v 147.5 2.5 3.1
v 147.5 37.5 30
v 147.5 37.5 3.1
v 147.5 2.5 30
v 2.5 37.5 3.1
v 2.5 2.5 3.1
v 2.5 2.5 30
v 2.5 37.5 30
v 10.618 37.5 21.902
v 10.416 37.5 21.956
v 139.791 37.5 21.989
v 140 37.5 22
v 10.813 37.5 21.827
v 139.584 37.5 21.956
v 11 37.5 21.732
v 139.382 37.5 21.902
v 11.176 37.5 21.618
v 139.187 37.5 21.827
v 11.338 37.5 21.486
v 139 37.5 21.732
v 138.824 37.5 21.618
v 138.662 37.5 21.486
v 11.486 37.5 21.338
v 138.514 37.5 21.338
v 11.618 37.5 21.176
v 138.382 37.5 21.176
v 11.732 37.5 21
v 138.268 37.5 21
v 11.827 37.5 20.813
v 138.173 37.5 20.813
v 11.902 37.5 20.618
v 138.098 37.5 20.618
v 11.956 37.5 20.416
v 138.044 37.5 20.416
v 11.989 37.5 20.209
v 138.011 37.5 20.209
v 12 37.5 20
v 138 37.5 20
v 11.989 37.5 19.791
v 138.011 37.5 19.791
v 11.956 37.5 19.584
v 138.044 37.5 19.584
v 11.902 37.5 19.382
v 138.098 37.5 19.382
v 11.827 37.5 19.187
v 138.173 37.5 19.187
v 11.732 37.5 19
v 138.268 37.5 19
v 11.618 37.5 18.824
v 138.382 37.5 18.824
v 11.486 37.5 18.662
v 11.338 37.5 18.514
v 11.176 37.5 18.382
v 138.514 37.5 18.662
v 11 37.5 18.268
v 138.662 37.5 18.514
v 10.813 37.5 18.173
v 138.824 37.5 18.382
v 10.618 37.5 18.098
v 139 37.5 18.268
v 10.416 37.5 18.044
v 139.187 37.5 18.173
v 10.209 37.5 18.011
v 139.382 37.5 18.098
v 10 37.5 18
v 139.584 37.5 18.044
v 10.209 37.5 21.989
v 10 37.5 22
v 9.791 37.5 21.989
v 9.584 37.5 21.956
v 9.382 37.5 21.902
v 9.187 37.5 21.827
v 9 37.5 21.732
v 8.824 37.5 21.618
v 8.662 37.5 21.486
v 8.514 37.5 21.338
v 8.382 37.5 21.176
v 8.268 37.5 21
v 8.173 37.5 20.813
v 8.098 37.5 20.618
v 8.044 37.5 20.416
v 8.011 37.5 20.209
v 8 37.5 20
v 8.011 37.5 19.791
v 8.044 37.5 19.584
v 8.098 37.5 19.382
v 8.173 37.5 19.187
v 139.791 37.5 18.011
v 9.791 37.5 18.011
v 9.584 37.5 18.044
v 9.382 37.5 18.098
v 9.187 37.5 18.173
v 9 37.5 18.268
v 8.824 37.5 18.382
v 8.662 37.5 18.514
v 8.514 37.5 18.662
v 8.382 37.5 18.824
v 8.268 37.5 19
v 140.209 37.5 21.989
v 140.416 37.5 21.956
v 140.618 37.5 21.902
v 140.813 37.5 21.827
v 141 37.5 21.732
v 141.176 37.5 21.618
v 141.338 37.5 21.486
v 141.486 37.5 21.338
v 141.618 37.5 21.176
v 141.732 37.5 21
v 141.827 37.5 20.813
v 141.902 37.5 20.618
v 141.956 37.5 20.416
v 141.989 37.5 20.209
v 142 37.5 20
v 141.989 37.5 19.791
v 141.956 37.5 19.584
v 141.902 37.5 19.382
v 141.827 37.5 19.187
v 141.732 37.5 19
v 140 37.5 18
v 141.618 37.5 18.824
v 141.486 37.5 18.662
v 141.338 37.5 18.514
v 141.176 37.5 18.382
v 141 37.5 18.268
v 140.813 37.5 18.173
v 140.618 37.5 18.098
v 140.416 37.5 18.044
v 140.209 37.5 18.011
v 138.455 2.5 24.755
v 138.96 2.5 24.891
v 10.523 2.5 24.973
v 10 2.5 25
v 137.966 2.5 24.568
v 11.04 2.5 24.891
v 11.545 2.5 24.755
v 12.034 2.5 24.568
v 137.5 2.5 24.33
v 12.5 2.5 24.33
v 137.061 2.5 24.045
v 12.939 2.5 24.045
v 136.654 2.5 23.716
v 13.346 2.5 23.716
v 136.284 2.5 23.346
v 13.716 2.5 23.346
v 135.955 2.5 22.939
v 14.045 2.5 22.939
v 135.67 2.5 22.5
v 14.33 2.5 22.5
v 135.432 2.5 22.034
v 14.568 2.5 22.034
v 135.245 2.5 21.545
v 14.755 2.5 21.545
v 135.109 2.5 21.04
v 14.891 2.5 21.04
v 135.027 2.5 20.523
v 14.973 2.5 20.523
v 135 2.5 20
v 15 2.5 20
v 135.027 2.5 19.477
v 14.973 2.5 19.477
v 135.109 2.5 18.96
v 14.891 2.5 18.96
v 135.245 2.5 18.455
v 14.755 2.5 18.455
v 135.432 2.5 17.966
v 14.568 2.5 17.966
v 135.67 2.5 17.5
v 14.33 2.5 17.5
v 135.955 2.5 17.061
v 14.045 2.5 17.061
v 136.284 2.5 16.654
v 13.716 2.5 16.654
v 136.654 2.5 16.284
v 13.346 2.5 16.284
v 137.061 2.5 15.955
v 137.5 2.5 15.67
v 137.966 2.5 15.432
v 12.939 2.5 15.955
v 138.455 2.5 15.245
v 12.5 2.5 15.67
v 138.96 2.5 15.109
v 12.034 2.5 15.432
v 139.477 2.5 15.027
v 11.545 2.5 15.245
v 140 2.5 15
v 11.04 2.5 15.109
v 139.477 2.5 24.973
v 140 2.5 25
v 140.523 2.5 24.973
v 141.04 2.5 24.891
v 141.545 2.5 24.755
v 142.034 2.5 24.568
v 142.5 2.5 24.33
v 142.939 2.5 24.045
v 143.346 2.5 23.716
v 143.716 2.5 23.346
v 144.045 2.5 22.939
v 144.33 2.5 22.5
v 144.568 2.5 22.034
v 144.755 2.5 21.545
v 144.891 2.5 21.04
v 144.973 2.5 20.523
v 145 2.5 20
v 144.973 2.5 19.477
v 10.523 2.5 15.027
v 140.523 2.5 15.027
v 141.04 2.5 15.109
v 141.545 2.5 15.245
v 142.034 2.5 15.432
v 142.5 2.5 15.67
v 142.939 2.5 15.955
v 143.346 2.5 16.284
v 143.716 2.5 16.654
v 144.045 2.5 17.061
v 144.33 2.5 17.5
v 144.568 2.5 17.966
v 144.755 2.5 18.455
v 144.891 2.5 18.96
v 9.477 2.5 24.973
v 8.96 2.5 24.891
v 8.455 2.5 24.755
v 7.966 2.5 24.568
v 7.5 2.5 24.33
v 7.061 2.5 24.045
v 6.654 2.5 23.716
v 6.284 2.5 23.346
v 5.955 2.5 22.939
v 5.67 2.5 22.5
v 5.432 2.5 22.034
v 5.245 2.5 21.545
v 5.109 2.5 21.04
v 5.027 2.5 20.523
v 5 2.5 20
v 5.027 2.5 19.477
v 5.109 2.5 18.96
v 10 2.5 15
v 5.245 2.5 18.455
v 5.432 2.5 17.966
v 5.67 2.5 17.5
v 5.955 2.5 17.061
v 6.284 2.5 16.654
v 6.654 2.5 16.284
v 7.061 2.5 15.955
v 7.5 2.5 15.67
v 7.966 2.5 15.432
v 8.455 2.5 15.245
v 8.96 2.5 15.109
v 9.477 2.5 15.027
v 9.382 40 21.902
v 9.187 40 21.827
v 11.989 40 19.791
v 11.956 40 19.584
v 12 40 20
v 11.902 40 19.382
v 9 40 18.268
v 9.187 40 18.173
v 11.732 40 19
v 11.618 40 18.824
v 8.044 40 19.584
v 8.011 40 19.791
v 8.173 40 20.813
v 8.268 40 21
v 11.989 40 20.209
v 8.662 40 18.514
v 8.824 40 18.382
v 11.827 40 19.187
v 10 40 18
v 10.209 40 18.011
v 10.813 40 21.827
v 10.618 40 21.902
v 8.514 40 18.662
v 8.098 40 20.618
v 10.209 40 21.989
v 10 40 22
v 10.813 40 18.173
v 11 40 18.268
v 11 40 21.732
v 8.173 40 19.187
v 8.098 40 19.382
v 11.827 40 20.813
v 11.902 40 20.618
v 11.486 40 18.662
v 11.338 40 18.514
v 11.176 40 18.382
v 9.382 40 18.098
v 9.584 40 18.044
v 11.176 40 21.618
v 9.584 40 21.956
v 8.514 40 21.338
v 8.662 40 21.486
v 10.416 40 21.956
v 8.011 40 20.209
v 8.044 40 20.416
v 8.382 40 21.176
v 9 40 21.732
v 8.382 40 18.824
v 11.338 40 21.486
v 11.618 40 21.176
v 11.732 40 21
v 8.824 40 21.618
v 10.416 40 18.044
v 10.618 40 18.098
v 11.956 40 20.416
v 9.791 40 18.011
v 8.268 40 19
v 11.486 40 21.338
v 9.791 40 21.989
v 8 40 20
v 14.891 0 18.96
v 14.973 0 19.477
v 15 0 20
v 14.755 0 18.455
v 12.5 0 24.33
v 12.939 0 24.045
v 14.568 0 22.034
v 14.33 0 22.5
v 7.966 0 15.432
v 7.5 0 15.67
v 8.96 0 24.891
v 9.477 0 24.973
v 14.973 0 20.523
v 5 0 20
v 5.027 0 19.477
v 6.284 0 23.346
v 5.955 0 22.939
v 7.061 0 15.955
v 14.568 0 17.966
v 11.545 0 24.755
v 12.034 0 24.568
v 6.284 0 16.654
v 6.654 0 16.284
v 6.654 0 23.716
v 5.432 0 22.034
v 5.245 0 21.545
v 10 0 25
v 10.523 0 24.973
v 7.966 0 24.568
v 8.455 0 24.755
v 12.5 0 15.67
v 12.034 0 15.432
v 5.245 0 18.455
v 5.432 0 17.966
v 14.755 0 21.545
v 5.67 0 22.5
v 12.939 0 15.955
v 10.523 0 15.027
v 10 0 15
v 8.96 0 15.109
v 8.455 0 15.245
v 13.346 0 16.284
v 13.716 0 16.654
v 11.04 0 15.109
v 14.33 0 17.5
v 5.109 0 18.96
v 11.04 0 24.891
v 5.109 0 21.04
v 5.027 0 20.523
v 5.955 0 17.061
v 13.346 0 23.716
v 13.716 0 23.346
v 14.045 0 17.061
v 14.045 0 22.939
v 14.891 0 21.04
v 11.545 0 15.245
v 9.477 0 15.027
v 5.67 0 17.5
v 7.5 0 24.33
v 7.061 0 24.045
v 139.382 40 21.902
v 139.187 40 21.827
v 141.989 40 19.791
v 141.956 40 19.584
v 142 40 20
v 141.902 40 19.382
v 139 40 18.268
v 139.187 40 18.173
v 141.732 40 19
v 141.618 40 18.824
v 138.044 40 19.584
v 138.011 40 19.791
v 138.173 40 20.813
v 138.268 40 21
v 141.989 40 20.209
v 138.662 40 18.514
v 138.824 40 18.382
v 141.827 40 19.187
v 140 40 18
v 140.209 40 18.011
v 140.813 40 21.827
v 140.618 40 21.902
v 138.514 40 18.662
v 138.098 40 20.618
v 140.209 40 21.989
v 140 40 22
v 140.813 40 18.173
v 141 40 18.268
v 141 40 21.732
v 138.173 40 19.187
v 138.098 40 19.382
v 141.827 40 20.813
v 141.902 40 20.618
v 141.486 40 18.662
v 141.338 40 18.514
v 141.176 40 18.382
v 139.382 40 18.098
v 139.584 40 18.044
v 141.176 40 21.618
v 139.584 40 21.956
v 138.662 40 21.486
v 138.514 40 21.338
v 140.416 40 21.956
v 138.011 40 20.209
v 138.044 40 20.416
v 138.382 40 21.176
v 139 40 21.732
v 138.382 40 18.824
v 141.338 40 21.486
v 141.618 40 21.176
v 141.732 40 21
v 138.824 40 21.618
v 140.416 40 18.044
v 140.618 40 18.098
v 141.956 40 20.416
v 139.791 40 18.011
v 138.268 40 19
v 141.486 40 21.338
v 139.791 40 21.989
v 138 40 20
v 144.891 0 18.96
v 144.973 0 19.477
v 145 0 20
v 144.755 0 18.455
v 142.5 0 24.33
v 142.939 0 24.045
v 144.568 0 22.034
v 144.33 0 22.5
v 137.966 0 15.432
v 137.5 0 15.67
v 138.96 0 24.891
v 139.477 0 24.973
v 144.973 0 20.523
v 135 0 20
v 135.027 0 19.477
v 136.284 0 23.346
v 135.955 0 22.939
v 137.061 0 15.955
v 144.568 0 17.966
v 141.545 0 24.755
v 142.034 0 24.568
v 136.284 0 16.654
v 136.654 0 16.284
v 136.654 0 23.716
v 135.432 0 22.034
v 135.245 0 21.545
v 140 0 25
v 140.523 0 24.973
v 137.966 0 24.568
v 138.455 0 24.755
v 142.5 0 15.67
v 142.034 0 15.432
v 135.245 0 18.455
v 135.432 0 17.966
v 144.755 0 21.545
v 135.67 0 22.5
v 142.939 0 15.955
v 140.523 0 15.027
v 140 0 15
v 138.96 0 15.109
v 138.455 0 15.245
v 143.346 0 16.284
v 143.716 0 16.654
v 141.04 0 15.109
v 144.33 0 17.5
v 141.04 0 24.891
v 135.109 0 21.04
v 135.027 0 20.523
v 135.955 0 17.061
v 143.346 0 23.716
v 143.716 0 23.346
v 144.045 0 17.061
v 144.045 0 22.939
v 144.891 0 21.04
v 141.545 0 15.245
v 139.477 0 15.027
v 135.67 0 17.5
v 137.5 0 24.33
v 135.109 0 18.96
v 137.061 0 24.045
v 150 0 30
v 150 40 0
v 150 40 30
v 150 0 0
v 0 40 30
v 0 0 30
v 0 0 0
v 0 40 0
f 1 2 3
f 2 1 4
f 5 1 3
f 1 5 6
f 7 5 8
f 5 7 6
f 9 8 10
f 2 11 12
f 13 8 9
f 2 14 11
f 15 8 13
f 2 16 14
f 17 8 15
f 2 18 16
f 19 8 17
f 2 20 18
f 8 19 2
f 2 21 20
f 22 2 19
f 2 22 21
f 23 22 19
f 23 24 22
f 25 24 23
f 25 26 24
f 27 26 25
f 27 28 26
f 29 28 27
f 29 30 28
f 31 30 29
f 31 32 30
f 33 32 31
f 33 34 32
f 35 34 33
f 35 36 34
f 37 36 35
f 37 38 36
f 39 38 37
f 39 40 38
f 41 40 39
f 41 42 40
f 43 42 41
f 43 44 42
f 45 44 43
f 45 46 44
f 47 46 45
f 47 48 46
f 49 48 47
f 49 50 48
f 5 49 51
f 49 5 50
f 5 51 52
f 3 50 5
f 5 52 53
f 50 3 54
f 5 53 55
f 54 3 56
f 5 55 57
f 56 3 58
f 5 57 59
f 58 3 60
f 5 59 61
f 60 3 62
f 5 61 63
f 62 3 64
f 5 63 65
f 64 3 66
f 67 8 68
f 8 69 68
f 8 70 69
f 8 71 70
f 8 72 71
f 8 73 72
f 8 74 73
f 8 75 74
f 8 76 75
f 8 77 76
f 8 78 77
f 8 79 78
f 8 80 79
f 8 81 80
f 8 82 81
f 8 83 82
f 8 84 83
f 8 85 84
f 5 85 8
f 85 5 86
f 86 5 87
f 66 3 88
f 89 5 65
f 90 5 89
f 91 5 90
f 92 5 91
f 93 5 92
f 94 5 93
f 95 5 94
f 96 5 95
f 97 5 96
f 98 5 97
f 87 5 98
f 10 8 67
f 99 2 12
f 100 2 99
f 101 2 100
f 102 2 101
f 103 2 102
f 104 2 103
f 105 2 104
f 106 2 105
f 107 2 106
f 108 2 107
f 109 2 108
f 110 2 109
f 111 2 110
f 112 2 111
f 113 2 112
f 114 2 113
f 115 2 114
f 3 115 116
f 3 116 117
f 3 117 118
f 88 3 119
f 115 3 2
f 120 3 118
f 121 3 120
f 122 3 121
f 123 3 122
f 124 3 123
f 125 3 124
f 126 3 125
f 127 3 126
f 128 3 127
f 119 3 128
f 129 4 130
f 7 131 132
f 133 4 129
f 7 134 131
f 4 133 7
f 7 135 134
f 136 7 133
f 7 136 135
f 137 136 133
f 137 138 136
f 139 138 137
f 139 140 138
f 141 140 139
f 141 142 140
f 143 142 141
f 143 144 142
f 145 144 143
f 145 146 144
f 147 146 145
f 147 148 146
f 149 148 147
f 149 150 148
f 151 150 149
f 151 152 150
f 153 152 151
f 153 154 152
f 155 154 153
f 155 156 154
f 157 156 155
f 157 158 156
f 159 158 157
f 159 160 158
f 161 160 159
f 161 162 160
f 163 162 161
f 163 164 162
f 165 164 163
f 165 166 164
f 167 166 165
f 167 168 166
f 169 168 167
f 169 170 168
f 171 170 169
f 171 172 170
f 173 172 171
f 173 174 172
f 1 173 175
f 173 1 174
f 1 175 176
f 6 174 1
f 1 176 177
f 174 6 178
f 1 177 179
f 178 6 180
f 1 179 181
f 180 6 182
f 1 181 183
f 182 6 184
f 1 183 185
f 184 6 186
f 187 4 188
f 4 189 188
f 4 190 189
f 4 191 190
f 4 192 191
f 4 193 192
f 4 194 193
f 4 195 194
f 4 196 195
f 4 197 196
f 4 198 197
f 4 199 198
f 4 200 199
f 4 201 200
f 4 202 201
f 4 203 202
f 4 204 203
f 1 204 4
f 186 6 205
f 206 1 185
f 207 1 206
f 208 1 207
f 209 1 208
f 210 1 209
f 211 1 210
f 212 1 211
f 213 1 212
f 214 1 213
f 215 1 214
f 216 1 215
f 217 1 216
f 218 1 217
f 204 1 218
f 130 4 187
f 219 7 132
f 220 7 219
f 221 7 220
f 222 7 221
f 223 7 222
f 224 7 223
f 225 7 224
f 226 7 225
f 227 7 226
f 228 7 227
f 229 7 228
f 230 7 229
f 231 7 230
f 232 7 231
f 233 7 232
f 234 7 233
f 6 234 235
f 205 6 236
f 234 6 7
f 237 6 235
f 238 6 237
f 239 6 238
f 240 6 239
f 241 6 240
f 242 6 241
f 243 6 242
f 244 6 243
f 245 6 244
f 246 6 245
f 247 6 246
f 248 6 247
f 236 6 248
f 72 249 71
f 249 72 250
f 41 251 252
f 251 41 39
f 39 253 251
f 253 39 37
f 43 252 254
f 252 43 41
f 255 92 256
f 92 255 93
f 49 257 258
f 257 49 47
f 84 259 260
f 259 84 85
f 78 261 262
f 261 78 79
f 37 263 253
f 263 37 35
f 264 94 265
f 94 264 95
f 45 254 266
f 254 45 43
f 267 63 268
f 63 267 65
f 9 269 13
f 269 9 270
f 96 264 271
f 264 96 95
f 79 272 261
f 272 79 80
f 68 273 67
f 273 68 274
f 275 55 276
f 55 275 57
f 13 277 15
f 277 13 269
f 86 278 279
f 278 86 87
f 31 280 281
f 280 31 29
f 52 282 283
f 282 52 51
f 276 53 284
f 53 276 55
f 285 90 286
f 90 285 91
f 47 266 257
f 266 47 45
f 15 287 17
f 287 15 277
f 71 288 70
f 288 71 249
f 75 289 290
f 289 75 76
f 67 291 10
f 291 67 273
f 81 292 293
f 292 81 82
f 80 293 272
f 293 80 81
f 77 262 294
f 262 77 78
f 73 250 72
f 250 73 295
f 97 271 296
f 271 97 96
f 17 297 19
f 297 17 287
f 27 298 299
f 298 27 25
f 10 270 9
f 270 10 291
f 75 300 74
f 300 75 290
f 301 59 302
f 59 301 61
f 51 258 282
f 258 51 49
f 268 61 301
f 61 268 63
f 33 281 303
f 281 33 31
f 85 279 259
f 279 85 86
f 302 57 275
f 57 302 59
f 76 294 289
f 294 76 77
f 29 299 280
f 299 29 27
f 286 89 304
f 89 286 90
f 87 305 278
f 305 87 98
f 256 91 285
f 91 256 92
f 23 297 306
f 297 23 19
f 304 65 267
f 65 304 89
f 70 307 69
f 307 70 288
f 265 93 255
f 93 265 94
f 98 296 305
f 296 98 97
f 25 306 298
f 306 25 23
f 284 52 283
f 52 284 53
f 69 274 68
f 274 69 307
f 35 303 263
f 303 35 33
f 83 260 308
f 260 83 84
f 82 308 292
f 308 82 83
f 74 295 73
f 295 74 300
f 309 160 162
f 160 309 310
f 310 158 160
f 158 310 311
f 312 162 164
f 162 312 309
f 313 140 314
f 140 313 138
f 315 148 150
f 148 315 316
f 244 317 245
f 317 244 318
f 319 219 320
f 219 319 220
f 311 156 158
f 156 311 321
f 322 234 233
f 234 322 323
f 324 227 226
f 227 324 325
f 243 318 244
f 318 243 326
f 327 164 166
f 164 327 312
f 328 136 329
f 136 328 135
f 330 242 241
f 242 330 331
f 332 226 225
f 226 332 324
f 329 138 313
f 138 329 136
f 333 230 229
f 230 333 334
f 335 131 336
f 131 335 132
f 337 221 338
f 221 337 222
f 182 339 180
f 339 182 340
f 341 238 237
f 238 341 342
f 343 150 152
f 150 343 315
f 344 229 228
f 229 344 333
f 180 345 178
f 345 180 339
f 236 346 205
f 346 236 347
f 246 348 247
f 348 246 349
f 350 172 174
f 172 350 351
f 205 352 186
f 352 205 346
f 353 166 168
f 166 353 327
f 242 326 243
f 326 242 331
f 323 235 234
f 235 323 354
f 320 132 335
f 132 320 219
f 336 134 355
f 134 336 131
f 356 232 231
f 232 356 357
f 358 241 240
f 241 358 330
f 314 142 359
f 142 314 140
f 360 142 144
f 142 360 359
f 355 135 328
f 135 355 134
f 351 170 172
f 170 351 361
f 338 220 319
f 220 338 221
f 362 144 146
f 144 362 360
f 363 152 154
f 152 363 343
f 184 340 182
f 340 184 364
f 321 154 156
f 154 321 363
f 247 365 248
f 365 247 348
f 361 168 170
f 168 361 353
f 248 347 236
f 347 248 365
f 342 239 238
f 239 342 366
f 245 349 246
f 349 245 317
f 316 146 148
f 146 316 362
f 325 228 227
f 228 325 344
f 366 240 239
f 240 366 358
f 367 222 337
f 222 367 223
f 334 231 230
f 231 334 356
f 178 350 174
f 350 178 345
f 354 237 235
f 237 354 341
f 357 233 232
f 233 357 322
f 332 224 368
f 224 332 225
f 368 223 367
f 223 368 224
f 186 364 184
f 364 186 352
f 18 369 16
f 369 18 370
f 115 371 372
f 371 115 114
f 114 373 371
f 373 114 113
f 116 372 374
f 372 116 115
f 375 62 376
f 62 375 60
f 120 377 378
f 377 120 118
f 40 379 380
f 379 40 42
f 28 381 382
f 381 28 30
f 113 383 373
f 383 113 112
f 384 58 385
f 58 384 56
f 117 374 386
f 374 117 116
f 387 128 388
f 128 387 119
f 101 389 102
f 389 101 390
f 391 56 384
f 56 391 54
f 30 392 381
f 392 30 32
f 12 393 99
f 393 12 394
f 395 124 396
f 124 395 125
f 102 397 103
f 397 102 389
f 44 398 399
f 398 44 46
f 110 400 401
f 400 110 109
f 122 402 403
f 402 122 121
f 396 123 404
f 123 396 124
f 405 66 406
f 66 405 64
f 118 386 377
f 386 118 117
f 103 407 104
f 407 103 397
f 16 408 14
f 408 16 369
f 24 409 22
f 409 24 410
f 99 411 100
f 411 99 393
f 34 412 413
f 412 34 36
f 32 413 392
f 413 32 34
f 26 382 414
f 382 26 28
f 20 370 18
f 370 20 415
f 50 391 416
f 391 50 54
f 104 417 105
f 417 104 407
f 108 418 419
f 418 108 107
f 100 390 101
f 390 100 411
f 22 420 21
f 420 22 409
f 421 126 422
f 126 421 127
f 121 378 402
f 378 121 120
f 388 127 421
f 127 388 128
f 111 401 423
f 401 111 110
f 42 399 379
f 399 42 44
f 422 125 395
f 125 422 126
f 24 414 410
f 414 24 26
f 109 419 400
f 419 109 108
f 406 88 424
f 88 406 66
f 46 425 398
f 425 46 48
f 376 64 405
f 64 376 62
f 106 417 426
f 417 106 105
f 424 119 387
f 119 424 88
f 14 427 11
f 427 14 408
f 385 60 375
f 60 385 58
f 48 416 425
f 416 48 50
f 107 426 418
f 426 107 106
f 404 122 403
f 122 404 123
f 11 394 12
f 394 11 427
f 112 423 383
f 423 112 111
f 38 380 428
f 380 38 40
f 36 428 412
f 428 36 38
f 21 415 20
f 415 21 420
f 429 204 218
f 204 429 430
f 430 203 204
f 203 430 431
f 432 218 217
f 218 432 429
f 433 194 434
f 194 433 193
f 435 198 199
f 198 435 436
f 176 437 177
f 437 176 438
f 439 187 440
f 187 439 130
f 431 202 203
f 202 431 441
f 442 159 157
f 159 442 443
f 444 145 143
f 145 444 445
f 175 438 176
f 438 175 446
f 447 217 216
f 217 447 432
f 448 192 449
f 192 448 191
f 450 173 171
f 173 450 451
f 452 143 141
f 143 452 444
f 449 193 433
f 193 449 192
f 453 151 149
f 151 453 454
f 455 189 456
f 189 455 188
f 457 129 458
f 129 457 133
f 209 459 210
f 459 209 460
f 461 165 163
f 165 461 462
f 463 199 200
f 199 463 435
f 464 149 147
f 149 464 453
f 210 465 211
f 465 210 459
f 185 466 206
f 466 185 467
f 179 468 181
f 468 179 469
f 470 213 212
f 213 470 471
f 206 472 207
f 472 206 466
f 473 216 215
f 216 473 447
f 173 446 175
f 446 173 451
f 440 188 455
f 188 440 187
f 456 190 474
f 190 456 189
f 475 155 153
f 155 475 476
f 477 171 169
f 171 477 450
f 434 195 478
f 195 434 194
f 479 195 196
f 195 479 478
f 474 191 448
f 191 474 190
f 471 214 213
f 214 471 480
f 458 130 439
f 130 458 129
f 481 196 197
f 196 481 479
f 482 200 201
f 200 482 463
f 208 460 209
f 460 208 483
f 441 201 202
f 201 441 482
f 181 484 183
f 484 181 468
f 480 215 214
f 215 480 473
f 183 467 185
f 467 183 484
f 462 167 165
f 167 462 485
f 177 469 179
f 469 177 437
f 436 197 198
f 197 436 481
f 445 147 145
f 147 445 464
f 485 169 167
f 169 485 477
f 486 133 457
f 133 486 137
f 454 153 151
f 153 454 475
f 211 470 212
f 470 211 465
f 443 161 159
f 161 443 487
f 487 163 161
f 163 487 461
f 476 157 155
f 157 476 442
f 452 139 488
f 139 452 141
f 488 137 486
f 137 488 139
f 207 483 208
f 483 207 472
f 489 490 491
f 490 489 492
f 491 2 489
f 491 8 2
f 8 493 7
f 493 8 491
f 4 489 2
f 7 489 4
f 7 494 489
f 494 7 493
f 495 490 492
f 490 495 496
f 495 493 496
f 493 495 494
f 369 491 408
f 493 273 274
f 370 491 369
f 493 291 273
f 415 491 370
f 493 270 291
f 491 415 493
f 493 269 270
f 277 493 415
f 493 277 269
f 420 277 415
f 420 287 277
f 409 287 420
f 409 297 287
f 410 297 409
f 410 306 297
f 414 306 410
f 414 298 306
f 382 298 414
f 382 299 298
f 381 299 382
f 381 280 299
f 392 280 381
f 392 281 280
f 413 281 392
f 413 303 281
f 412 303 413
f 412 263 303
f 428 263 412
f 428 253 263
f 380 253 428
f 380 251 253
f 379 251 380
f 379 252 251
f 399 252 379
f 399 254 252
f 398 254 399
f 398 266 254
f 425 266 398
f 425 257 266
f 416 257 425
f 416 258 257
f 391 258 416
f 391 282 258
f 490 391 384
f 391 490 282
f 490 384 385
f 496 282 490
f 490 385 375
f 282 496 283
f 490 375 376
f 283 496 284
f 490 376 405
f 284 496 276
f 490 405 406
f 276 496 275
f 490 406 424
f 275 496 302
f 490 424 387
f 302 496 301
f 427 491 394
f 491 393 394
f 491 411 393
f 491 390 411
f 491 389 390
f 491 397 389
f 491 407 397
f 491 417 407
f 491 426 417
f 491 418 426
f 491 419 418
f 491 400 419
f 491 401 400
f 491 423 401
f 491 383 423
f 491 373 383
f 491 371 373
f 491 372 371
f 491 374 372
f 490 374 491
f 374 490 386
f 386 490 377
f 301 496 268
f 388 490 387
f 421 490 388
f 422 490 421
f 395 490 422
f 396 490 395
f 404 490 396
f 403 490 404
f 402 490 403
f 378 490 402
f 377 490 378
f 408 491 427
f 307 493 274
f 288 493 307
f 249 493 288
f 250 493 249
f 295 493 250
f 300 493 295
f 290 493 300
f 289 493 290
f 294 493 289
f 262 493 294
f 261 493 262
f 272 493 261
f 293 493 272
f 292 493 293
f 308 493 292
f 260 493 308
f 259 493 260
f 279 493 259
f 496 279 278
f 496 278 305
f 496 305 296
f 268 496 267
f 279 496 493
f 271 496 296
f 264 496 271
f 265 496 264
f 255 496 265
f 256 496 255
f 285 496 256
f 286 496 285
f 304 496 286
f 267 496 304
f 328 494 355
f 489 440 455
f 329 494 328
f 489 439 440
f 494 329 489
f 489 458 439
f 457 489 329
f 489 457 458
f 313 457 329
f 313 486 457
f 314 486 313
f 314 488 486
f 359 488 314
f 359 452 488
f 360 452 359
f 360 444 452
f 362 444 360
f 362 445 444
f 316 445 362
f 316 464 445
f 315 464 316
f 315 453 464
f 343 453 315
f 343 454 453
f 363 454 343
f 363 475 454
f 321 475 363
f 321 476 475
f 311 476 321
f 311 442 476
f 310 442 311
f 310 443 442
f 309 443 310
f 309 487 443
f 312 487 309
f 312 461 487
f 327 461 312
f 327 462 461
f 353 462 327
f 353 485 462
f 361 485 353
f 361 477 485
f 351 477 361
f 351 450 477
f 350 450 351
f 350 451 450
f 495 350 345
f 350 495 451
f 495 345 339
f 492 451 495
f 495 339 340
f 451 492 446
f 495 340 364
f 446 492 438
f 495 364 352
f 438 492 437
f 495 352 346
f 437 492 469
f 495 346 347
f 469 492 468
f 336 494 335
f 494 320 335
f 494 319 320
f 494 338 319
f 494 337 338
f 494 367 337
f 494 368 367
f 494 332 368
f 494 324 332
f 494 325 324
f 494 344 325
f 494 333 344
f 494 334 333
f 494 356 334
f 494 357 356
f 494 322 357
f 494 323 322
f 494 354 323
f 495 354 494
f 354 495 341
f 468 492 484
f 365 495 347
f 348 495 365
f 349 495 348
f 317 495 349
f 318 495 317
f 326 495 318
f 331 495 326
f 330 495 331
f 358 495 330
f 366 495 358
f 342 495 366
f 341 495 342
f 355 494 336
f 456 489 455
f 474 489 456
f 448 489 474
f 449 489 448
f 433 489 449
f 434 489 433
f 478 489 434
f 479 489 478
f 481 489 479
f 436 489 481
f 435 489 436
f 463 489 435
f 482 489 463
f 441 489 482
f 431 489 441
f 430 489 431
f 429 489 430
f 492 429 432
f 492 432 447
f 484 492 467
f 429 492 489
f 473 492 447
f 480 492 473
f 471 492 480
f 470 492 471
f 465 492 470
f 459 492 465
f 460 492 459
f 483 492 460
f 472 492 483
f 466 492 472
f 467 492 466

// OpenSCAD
module unit1()
{
    rotate([-90,0,0])
    difference()
    {
        cube([150, 4, 20]);
        union()
        {
            for(x=[11:9.1:140])
            {
                translate([x,-0.05,14]) rotate([-90,0,0])cylinder(r=4.25, h=2.9);    
                translate([x,-0.05,5]) rotate([-90,0,0])cylinder(r=4.25, h=2.9);    
            }
            translate([4,-0.05,10]) rotate([-90,0,0])cylinder(r=2.05, h=10);    
            translate([146,-0.05,10]) rotate([-90,0,0])cylinder(r=2.05, h=10);    
        }    
    }
}

module unit2()
{
    difference()
    {
        cube([150,40,30]);
        union()
        {
            translate([2.5,2.5,3.1])cube([145,35,27]);    
            translate([10,-1,20])rotate([-90,0,0])cylinder(r=2, h=60, $fn=60);
            translate([10,-1,20])rotate([-90,0,0])cylinder(r=5, h=10, $fn=60);
            translate([140,-1,20])rotate([-90,0,0])cylinder(r=2, h=60, $fn=60);
            translate([140,-1,20])rotate([-90,0,0])cylinder(r=5, h=10, $fn=60);
        }
    }    
}

unit2();
